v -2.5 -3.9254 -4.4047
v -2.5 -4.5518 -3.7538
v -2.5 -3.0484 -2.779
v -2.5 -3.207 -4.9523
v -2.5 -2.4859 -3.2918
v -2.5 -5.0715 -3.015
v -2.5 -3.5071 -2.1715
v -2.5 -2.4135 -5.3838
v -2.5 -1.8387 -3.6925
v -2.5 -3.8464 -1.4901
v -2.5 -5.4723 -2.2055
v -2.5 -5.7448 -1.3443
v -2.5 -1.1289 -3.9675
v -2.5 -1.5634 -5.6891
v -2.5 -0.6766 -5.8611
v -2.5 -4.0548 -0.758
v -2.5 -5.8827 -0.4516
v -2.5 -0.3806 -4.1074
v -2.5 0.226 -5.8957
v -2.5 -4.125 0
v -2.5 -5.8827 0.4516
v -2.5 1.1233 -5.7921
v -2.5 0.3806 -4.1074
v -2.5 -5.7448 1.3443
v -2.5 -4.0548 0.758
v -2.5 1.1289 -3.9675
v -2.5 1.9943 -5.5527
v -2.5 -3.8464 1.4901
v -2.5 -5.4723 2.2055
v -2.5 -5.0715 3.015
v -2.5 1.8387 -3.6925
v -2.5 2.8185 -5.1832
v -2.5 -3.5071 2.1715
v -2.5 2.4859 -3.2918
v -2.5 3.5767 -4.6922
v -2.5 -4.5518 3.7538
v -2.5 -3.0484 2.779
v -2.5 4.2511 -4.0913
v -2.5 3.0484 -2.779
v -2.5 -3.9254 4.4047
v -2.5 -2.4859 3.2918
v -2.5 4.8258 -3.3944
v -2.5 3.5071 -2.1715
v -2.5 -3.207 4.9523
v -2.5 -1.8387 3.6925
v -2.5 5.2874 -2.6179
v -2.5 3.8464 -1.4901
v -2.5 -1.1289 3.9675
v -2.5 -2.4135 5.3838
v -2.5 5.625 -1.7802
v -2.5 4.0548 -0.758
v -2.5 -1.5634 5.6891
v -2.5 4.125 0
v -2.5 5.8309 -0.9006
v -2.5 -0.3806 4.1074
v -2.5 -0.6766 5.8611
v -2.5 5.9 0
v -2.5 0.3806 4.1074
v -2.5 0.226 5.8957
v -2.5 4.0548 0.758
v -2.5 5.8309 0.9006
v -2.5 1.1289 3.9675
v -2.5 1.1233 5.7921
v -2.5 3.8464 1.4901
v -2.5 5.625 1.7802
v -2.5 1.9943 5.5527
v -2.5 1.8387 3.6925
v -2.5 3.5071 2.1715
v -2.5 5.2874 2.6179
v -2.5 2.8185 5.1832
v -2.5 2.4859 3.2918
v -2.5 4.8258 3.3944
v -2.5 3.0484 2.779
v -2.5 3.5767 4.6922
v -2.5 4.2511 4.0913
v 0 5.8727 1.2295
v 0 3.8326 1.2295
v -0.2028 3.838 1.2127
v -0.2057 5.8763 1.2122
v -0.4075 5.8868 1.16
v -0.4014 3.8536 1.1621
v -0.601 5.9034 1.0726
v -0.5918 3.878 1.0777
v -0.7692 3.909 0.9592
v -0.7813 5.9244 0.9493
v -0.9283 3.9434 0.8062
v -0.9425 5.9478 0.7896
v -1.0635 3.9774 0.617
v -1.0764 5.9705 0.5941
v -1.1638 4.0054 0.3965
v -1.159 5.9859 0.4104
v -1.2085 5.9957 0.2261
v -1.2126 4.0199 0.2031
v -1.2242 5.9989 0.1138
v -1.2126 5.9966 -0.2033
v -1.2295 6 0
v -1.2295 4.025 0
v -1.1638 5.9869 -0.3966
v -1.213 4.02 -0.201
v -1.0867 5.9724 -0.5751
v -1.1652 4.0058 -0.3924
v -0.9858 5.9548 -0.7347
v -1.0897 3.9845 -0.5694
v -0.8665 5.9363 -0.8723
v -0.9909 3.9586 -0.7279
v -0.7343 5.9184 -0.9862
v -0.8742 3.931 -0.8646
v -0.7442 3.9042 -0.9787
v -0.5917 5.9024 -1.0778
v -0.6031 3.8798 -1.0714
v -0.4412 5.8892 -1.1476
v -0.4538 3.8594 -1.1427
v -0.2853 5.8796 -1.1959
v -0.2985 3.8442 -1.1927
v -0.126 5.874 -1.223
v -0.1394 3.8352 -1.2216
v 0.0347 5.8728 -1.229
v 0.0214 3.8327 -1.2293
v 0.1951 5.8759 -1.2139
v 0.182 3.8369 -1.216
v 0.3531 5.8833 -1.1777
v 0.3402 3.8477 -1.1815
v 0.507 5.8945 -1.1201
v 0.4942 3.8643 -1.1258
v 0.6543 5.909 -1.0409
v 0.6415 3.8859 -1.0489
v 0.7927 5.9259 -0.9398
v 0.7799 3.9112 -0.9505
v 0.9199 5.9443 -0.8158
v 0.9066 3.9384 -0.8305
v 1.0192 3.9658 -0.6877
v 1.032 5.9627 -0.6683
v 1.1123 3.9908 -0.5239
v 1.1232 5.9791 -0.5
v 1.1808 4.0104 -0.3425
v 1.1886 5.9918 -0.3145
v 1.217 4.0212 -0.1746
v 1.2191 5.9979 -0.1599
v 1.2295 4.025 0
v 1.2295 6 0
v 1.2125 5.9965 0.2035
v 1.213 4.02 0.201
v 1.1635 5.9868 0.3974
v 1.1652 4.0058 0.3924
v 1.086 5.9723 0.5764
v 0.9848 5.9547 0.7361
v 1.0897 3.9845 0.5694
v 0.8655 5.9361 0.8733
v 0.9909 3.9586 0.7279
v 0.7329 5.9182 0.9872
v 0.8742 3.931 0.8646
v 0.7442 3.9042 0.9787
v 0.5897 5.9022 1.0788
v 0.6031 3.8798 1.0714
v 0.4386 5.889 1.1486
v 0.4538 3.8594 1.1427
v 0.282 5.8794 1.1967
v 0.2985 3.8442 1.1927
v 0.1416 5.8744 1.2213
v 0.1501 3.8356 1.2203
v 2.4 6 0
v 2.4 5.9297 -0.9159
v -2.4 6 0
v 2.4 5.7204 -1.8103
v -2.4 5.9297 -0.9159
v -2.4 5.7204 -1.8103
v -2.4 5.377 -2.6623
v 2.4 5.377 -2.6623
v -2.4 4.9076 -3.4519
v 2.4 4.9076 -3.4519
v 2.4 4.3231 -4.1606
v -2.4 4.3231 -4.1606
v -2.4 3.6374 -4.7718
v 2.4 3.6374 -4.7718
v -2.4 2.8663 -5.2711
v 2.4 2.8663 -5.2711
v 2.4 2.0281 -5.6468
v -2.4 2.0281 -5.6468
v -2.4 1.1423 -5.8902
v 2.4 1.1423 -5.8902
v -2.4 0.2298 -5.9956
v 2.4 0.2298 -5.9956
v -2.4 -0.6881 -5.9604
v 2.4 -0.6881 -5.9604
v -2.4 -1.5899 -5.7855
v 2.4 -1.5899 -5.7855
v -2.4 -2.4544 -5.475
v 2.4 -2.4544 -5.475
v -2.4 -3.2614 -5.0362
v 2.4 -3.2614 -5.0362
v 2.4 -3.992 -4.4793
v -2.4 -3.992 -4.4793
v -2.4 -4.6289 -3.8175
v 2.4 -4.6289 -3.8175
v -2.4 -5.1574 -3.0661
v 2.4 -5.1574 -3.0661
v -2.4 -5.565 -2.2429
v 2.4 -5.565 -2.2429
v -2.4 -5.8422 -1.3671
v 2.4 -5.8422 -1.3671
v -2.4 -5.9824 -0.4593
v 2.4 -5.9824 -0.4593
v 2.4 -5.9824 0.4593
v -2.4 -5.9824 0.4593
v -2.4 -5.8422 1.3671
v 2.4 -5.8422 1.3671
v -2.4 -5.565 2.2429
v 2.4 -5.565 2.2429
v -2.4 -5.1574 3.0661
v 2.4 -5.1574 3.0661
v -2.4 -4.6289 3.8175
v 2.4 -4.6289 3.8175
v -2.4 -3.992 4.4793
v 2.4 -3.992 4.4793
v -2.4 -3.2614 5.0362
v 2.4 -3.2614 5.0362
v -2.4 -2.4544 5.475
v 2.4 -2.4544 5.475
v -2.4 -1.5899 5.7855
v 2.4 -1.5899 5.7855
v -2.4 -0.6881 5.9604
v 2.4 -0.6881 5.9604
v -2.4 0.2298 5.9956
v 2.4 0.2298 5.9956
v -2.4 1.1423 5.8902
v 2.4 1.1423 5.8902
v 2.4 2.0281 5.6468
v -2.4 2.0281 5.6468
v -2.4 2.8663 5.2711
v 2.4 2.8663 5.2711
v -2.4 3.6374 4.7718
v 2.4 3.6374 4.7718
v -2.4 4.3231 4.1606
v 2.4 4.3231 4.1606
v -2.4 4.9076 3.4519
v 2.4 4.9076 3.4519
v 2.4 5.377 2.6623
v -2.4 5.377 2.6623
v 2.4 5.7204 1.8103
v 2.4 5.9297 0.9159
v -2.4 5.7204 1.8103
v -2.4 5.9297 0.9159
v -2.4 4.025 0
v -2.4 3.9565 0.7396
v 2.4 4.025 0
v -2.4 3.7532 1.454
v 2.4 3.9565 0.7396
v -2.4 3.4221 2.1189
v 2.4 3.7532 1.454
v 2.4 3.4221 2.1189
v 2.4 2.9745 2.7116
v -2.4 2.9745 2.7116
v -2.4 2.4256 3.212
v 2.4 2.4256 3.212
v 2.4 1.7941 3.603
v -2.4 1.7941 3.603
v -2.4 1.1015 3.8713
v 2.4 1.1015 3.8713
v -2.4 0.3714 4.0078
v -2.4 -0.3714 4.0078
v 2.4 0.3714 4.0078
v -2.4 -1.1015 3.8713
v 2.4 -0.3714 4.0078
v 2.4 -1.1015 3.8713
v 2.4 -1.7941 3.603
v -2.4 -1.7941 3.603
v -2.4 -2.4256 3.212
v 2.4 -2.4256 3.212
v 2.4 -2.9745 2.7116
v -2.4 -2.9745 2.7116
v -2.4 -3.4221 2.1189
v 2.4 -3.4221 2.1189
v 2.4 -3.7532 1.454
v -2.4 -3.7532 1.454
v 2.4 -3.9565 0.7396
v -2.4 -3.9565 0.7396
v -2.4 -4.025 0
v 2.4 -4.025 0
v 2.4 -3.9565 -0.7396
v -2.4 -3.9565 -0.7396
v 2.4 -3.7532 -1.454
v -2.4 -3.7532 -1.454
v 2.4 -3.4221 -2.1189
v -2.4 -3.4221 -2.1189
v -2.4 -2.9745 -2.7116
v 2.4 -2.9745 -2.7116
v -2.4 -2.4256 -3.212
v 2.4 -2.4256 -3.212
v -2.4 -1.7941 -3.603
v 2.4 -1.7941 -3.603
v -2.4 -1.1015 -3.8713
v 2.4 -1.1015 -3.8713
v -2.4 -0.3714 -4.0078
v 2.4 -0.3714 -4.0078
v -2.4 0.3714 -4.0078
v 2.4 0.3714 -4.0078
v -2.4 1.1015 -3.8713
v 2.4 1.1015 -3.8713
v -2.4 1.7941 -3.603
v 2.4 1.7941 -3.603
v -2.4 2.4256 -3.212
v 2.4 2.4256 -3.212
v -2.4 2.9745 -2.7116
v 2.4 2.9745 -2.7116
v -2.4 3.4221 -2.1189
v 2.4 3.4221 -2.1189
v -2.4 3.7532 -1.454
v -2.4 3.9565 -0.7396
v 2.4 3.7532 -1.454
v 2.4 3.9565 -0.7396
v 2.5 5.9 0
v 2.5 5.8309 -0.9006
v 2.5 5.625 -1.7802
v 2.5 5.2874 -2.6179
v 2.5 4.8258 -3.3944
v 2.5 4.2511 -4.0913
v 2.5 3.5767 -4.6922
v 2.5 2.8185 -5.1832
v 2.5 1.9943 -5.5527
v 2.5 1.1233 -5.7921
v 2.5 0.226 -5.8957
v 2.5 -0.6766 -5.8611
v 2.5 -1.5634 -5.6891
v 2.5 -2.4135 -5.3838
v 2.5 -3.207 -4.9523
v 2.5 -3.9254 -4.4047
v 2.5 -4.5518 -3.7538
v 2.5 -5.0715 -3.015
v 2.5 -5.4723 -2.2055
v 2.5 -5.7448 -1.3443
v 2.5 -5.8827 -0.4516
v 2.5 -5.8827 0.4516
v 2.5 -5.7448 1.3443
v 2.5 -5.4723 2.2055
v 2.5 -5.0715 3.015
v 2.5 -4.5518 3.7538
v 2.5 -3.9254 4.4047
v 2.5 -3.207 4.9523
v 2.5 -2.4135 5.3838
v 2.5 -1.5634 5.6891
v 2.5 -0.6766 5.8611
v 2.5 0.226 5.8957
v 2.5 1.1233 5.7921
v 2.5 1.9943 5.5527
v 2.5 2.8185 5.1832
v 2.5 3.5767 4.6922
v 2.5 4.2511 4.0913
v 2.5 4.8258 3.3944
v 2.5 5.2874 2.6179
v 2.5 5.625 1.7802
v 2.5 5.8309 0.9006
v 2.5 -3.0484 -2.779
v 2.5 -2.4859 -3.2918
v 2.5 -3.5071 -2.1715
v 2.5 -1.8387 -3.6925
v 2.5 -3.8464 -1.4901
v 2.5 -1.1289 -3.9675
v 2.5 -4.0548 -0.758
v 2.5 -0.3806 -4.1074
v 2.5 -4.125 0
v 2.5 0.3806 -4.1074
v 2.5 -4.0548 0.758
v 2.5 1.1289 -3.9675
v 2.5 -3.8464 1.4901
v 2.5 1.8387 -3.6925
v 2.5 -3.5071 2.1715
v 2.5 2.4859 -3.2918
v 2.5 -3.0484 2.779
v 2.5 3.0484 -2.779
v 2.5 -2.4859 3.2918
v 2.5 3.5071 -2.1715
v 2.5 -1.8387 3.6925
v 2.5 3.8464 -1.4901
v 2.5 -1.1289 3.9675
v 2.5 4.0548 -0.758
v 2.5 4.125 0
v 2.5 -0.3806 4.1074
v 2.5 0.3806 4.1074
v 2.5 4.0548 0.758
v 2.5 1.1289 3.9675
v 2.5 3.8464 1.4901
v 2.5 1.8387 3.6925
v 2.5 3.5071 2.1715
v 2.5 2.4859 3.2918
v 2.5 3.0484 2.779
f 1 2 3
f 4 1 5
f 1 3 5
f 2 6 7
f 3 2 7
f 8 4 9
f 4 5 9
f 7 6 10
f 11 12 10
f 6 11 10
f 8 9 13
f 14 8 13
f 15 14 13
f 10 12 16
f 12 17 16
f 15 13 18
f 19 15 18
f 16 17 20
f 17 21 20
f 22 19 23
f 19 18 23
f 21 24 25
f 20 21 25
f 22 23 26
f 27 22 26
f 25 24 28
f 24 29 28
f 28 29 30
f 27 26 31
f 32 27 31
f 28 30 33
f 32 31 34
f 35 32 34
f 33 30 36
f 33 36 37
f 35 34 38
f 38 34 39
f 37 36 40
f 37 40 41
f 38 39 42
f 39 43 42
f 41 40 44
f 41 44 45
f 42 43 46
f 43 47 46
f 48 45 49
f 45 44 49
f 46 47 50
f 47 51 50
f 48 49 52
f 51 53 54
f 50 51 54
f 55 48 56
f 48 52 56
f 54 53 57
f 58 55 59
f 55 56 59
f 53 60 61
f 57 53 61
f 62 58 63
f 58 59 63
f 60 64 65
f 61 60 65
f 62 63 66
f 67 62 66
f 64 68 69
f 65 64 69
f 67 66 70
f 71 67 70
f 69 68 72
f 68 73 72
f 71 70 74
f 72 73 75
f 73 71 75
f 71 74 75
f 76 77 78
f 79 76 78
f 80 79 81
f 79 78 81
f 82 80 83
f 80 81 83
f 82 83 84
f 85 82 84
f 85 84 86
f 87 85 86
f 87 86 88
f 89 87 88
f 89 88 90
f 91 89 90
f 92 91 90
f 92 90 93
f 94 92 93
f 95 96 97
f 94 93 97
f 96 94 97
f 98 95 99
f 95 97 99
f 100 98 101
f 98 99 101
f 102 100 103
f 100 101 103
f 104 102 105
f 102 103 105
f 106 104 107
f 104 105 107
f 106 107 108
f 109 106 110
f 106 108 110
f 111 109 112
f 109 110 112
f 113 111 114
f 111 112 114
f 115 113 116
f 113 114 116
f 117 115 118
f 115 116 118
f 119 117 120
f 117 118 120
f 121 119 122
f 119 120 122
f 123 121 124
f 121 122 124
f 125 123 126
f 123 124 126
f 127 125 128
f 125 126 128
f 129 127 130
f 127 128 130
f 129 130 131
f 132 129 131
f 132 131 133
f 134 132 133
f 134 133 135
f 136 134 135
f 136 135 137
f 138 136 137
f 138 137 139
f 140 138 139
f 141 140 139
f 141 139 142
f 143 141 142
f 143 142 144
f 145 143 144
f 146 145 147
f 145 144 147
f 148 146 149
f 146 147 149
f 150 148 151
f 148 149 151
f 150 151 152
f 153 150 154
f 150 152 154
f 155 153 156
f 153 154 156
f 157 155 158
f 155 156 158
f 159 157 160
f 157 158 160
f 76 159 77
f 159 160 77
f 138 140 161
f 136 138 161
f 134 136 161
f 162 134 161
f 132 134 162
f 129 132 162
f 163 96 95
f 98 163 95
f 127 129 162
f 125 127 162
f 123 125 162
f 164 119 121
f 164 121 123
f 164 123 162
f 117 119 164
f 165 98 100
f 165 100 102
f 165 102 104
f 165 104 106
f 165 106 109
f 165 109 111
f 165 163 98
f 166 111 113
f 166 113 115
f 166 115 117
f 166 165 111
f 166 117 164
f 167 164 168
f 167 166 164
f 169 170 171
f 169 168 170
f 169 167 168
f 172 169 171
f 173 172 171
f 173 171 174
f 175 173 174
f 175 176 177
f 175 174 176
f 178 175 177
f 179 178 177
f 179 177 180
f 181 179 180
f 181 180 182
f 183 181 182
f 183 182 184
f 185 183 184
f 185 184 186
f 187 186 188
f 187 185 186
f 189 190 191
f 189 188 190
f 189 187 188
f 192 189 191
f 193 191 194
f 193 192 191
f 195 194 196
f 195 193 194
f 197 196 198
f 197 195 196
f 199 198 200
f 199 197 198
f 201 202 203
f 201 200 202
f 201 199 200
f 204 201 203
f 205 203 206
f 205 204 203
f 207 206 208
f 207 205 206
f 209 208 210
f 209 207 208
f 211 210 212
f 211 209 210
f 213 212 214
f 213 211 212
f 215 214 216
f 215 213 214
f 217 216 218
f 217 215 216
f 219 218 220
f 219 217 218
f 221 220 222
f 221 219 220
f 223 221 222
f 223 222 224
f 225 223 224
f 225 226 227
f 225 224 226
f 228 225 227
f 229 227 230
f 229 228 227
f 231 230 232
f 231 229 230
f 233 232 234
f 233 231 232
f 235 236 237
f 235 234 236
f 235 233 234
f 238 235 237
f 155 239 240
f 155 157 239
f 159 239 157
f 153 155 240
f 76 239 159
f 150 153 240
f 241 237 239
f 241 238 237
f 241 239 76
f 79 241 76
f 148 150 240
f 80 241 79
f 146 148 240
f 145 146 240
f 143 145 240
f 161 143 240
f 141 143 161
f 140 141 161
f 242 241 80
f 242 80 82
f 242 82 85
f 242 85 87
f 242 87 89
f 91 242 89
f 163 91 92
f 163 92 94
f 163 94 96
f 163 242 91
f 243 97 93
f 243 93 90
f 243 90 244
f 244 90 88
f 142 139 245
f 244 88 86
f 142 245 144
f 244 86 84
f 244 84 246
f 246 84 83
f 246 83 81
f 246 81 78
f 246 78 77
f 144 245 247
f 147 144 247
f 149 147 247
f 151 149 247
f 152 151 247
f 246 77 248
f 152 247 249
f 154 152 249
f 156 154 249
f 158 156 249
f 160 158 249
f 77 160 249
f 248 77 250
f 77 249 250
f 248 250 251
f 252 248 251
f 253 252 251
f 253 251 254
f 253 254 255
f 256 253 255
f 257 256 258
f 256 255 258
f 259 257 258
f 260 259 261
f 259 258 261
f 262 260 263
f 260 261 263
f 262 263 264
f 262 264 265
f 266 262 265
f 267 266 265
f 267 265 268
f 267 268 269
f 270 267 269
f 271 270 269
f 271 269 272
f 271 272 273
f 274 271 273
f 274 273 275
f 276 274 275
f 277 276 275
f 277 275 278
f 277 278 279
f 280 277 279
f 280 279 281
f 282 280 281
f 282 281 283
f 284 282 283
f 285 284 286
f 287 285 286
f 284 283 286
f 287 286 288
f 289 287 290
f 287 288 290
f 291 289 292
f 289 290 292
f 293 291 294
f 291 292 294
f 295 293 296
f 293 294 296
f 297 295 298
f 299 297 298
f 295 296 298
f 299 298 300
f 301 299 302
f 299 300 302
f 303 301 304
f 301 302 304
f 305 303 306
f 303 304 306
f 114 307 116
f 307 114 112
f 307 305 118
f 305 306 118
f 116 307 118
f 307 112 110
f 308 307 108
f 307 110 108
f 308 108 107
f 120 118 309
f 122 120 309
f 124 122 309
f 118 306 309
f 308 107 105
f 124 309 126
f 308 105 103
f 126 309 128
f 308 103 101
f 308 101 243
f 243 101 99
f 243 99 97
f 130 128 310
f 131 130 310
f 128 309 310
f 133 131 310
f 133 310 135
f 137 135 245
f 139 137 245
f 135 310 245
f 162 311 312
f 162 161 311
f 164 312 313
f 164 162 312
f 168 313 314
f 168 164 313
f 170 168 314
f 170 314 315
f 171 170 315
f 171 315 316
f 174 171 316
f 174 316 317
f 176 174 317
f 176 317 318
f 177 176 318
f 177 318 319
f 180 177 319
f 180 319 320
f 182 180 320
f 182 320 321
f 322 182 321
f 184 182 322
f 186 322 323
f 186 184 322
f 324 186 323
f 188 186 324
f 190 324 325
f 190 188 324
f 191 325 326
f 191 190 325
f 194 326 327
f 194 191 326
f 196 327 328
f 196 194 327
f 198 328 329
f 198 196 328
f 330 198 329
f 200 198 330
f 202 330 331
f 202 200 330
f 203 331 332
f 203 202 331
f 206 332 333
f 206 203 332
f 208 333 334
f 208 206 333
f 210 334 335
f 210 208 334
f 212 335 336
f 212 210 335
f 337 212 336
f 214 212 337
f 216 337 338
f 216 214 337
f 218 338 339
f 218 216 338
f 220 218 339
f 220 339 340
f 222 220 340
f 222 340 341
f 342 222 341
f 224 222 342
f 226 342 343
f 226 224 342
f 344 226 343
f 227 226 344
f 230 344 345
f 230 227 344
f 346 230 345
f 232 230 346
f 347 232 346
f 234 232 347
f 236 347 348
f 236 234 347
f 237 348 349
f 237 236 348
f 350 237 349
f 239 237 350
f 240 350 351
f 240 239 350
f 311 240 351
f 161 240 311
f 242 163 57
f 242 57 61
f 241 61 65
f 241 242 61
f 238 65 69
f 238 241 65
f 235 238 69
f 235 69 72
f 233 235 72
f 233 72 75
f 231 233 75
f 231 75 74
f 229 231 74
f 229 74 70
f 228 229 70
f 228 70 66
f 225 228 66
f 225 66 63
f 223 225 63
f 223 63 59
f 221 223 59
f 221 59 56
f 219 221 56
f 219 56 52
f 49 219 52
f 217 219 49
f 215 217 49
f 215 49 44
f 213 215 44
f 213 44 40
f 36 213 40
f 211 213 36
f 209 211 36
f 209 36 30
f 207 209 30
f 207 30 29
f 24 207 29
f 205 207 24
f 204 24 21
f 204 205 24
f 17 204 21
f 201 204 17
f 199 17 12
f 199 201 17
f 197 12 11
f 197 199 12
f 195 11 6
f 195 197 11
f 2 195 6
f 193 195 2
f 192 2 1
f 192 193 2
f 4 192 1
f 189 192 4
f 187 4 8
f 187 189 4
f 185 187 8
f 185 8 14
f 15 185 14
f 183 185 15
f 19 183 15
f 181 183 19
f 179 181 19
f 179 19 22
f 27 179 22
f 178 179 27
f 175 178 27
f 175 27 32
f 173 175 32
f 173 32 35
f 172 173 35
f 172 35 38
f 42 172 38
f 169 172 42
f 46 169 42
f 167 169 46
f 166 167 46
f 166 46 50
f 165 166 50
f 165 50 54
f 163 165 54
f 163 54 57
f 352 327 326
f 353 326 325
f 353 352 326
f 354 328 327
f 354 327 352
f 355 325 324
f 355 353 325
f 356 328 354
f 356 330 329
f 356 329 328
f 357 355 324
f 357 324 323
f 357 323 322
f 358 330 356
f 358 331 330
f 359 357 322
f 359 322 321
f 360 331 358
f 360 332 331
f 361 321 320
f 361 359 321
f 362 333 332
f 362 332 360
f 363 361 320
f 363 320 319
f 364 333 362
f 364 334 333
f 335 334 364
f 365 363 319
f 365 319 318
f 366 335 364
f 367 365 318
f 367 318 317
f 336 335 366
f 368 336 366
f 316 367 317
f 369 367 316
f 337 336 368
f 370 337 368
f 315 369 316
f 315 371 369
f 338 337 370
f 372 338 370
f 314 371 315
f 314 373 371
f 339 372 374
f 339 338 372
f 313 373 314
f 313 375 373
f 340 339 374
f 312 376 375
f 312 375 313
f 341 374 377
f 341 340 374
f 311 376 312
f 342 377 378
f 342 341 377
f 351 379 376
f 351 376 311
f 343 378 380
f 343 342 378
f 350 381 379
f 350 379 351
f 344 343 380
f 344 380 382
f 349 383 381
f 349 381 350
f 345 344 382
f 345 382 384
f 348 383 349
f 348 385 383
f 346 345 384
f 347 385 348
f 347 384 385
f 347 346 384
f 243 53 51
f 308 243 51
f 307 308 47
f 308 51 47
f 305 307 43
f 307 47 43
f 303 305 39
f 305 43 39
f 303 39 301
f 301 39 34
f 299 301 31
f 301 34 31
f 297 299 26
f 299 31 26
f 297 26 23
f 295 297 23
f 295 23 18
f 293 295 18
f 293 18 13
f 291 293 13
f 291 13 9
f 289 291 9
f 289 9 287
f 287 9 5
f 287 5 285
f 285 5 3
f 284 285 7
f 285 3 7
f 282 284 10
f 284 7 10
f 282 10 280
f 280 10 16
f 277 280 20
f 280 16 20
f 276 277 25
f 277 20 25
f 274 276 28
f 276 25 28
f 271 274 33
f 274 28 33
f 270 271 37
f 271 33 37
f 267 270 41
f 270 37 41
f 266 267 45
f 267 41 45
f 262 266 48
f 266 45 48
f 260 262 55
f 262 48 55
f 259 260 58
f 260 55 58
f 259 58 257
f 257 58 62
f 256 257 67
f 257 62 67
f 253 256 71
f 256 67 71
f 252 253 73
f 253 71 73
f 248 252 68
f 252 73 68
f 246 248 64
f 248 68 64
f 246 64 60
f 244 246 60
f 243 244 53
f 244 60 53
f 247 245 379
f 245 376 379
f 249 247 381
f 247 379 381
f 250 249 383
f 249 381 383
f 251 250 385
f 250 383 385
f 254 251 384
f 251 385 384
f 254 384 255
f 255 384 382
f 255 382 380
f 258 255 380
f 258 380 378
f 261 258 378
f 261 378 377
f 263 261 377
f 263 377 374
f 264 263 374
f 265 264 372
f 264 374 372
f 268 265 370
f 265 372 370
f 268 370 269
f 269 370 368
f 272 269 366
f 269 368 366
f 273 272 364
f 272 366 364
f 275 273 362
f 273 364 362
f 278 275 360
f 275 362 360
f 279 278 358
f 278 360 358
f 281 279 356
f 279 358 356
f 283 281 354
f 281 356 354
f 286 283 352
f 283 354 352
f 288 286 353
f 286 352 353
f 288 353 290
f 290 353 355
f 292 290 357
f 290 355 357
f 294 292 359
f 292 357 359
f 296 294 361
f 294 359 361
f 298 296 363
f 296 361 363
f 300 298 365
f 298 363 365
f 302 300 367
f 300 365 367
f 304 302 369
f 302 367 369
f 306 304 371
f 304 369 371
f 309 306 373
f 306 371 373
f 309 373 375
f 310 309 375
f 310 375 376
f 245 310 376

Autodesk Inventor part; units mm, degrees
ref_plane "YZ Plane" through (0, 0, 0) normal (1, 0, 0) x (0, 1, 0)
ref_plane "XY Plane" through (0, 0, 0) normal (0, 0, 1) x (1, 0, 0)
sketch "Skizze1" plane through (0, 0, 0) normal (0, 0, 1) x (1, 0, 0)
  line L0 (-9.8448, 0) -> (9.4061, 0)
  line L1 (-2.4, 4.025) -> (2.4, 4.025)
  line L2 (2.5, 4.125) -> (2.5, 5.9)
  line L3 (2.4, 6) -> (-2.4, 6)
  line L4 (-2.5, 5.9) -> (-2.5, 4.125)
  line L5 (0, 0) -> (0, 4.025) construction
  line L6 (-2.4, 4.025) -> (-2.5, 4.125)
  line L7 (2.4, 4.025) -> (2.5, 4.125)
  line L8 (2.5, 5.9) -> (2.4, 6)
  line L9 (-2.4, 6) -> (-2.5, 5.9)
  point P0 (-2.5, 4.025)
  point P1 (2.5, 6)
  point P2 (2.5, 4.025)
  point P3 (-2.5, 6)
  dimension "d0" = 0.1
  dimension "d1" = 0.1
  dimension "d2" = 0.1
  dimension "d3" = 0.1
  dimension "d4" = 0.1
  dimension "d5" = 0.1
  dimension "d6" = 0.1
  dimension "d7" = 0.1
  dimension "d8" = 8.05
  dimension "d9" = 12
  dimension "d10" = 5
revolve "Umdrehung1" add sketch "Skizze1" angle 360 about axis through (-9.8448, 0, 0) along (1, 0, 0)
ref_plane "Arbeitsebene1" through (0, 6, 0) normal (0, 1, 0) x (-1, 0, 0)
sketch "Skizze2" plane through (0, 6, 0) normal (0, 1, 0) x (-1, 0, 0)
  point P0 (0, 0)
  point P1 (0, 0)
hole "Bohrung1" at (0, 6, 0) direction (0, -1, 0) diameter 2.459 end up to surface thread size "M3x0.5" class "6H" standard "ANSI Metric M Profile"
equation "\"d1\" = d0"
equation "\"d2\" = d0"
equation "\"d3\" = d2"
equation "\"d4\" = d0"
equation "\"d5\" = d4"
equation "\"d6\" = d0"
equation "\"d7\" = d6"
properties part number "pos-ring_d8_D12_t5_M3_V1" material "Messing, weicher Gelbton"
